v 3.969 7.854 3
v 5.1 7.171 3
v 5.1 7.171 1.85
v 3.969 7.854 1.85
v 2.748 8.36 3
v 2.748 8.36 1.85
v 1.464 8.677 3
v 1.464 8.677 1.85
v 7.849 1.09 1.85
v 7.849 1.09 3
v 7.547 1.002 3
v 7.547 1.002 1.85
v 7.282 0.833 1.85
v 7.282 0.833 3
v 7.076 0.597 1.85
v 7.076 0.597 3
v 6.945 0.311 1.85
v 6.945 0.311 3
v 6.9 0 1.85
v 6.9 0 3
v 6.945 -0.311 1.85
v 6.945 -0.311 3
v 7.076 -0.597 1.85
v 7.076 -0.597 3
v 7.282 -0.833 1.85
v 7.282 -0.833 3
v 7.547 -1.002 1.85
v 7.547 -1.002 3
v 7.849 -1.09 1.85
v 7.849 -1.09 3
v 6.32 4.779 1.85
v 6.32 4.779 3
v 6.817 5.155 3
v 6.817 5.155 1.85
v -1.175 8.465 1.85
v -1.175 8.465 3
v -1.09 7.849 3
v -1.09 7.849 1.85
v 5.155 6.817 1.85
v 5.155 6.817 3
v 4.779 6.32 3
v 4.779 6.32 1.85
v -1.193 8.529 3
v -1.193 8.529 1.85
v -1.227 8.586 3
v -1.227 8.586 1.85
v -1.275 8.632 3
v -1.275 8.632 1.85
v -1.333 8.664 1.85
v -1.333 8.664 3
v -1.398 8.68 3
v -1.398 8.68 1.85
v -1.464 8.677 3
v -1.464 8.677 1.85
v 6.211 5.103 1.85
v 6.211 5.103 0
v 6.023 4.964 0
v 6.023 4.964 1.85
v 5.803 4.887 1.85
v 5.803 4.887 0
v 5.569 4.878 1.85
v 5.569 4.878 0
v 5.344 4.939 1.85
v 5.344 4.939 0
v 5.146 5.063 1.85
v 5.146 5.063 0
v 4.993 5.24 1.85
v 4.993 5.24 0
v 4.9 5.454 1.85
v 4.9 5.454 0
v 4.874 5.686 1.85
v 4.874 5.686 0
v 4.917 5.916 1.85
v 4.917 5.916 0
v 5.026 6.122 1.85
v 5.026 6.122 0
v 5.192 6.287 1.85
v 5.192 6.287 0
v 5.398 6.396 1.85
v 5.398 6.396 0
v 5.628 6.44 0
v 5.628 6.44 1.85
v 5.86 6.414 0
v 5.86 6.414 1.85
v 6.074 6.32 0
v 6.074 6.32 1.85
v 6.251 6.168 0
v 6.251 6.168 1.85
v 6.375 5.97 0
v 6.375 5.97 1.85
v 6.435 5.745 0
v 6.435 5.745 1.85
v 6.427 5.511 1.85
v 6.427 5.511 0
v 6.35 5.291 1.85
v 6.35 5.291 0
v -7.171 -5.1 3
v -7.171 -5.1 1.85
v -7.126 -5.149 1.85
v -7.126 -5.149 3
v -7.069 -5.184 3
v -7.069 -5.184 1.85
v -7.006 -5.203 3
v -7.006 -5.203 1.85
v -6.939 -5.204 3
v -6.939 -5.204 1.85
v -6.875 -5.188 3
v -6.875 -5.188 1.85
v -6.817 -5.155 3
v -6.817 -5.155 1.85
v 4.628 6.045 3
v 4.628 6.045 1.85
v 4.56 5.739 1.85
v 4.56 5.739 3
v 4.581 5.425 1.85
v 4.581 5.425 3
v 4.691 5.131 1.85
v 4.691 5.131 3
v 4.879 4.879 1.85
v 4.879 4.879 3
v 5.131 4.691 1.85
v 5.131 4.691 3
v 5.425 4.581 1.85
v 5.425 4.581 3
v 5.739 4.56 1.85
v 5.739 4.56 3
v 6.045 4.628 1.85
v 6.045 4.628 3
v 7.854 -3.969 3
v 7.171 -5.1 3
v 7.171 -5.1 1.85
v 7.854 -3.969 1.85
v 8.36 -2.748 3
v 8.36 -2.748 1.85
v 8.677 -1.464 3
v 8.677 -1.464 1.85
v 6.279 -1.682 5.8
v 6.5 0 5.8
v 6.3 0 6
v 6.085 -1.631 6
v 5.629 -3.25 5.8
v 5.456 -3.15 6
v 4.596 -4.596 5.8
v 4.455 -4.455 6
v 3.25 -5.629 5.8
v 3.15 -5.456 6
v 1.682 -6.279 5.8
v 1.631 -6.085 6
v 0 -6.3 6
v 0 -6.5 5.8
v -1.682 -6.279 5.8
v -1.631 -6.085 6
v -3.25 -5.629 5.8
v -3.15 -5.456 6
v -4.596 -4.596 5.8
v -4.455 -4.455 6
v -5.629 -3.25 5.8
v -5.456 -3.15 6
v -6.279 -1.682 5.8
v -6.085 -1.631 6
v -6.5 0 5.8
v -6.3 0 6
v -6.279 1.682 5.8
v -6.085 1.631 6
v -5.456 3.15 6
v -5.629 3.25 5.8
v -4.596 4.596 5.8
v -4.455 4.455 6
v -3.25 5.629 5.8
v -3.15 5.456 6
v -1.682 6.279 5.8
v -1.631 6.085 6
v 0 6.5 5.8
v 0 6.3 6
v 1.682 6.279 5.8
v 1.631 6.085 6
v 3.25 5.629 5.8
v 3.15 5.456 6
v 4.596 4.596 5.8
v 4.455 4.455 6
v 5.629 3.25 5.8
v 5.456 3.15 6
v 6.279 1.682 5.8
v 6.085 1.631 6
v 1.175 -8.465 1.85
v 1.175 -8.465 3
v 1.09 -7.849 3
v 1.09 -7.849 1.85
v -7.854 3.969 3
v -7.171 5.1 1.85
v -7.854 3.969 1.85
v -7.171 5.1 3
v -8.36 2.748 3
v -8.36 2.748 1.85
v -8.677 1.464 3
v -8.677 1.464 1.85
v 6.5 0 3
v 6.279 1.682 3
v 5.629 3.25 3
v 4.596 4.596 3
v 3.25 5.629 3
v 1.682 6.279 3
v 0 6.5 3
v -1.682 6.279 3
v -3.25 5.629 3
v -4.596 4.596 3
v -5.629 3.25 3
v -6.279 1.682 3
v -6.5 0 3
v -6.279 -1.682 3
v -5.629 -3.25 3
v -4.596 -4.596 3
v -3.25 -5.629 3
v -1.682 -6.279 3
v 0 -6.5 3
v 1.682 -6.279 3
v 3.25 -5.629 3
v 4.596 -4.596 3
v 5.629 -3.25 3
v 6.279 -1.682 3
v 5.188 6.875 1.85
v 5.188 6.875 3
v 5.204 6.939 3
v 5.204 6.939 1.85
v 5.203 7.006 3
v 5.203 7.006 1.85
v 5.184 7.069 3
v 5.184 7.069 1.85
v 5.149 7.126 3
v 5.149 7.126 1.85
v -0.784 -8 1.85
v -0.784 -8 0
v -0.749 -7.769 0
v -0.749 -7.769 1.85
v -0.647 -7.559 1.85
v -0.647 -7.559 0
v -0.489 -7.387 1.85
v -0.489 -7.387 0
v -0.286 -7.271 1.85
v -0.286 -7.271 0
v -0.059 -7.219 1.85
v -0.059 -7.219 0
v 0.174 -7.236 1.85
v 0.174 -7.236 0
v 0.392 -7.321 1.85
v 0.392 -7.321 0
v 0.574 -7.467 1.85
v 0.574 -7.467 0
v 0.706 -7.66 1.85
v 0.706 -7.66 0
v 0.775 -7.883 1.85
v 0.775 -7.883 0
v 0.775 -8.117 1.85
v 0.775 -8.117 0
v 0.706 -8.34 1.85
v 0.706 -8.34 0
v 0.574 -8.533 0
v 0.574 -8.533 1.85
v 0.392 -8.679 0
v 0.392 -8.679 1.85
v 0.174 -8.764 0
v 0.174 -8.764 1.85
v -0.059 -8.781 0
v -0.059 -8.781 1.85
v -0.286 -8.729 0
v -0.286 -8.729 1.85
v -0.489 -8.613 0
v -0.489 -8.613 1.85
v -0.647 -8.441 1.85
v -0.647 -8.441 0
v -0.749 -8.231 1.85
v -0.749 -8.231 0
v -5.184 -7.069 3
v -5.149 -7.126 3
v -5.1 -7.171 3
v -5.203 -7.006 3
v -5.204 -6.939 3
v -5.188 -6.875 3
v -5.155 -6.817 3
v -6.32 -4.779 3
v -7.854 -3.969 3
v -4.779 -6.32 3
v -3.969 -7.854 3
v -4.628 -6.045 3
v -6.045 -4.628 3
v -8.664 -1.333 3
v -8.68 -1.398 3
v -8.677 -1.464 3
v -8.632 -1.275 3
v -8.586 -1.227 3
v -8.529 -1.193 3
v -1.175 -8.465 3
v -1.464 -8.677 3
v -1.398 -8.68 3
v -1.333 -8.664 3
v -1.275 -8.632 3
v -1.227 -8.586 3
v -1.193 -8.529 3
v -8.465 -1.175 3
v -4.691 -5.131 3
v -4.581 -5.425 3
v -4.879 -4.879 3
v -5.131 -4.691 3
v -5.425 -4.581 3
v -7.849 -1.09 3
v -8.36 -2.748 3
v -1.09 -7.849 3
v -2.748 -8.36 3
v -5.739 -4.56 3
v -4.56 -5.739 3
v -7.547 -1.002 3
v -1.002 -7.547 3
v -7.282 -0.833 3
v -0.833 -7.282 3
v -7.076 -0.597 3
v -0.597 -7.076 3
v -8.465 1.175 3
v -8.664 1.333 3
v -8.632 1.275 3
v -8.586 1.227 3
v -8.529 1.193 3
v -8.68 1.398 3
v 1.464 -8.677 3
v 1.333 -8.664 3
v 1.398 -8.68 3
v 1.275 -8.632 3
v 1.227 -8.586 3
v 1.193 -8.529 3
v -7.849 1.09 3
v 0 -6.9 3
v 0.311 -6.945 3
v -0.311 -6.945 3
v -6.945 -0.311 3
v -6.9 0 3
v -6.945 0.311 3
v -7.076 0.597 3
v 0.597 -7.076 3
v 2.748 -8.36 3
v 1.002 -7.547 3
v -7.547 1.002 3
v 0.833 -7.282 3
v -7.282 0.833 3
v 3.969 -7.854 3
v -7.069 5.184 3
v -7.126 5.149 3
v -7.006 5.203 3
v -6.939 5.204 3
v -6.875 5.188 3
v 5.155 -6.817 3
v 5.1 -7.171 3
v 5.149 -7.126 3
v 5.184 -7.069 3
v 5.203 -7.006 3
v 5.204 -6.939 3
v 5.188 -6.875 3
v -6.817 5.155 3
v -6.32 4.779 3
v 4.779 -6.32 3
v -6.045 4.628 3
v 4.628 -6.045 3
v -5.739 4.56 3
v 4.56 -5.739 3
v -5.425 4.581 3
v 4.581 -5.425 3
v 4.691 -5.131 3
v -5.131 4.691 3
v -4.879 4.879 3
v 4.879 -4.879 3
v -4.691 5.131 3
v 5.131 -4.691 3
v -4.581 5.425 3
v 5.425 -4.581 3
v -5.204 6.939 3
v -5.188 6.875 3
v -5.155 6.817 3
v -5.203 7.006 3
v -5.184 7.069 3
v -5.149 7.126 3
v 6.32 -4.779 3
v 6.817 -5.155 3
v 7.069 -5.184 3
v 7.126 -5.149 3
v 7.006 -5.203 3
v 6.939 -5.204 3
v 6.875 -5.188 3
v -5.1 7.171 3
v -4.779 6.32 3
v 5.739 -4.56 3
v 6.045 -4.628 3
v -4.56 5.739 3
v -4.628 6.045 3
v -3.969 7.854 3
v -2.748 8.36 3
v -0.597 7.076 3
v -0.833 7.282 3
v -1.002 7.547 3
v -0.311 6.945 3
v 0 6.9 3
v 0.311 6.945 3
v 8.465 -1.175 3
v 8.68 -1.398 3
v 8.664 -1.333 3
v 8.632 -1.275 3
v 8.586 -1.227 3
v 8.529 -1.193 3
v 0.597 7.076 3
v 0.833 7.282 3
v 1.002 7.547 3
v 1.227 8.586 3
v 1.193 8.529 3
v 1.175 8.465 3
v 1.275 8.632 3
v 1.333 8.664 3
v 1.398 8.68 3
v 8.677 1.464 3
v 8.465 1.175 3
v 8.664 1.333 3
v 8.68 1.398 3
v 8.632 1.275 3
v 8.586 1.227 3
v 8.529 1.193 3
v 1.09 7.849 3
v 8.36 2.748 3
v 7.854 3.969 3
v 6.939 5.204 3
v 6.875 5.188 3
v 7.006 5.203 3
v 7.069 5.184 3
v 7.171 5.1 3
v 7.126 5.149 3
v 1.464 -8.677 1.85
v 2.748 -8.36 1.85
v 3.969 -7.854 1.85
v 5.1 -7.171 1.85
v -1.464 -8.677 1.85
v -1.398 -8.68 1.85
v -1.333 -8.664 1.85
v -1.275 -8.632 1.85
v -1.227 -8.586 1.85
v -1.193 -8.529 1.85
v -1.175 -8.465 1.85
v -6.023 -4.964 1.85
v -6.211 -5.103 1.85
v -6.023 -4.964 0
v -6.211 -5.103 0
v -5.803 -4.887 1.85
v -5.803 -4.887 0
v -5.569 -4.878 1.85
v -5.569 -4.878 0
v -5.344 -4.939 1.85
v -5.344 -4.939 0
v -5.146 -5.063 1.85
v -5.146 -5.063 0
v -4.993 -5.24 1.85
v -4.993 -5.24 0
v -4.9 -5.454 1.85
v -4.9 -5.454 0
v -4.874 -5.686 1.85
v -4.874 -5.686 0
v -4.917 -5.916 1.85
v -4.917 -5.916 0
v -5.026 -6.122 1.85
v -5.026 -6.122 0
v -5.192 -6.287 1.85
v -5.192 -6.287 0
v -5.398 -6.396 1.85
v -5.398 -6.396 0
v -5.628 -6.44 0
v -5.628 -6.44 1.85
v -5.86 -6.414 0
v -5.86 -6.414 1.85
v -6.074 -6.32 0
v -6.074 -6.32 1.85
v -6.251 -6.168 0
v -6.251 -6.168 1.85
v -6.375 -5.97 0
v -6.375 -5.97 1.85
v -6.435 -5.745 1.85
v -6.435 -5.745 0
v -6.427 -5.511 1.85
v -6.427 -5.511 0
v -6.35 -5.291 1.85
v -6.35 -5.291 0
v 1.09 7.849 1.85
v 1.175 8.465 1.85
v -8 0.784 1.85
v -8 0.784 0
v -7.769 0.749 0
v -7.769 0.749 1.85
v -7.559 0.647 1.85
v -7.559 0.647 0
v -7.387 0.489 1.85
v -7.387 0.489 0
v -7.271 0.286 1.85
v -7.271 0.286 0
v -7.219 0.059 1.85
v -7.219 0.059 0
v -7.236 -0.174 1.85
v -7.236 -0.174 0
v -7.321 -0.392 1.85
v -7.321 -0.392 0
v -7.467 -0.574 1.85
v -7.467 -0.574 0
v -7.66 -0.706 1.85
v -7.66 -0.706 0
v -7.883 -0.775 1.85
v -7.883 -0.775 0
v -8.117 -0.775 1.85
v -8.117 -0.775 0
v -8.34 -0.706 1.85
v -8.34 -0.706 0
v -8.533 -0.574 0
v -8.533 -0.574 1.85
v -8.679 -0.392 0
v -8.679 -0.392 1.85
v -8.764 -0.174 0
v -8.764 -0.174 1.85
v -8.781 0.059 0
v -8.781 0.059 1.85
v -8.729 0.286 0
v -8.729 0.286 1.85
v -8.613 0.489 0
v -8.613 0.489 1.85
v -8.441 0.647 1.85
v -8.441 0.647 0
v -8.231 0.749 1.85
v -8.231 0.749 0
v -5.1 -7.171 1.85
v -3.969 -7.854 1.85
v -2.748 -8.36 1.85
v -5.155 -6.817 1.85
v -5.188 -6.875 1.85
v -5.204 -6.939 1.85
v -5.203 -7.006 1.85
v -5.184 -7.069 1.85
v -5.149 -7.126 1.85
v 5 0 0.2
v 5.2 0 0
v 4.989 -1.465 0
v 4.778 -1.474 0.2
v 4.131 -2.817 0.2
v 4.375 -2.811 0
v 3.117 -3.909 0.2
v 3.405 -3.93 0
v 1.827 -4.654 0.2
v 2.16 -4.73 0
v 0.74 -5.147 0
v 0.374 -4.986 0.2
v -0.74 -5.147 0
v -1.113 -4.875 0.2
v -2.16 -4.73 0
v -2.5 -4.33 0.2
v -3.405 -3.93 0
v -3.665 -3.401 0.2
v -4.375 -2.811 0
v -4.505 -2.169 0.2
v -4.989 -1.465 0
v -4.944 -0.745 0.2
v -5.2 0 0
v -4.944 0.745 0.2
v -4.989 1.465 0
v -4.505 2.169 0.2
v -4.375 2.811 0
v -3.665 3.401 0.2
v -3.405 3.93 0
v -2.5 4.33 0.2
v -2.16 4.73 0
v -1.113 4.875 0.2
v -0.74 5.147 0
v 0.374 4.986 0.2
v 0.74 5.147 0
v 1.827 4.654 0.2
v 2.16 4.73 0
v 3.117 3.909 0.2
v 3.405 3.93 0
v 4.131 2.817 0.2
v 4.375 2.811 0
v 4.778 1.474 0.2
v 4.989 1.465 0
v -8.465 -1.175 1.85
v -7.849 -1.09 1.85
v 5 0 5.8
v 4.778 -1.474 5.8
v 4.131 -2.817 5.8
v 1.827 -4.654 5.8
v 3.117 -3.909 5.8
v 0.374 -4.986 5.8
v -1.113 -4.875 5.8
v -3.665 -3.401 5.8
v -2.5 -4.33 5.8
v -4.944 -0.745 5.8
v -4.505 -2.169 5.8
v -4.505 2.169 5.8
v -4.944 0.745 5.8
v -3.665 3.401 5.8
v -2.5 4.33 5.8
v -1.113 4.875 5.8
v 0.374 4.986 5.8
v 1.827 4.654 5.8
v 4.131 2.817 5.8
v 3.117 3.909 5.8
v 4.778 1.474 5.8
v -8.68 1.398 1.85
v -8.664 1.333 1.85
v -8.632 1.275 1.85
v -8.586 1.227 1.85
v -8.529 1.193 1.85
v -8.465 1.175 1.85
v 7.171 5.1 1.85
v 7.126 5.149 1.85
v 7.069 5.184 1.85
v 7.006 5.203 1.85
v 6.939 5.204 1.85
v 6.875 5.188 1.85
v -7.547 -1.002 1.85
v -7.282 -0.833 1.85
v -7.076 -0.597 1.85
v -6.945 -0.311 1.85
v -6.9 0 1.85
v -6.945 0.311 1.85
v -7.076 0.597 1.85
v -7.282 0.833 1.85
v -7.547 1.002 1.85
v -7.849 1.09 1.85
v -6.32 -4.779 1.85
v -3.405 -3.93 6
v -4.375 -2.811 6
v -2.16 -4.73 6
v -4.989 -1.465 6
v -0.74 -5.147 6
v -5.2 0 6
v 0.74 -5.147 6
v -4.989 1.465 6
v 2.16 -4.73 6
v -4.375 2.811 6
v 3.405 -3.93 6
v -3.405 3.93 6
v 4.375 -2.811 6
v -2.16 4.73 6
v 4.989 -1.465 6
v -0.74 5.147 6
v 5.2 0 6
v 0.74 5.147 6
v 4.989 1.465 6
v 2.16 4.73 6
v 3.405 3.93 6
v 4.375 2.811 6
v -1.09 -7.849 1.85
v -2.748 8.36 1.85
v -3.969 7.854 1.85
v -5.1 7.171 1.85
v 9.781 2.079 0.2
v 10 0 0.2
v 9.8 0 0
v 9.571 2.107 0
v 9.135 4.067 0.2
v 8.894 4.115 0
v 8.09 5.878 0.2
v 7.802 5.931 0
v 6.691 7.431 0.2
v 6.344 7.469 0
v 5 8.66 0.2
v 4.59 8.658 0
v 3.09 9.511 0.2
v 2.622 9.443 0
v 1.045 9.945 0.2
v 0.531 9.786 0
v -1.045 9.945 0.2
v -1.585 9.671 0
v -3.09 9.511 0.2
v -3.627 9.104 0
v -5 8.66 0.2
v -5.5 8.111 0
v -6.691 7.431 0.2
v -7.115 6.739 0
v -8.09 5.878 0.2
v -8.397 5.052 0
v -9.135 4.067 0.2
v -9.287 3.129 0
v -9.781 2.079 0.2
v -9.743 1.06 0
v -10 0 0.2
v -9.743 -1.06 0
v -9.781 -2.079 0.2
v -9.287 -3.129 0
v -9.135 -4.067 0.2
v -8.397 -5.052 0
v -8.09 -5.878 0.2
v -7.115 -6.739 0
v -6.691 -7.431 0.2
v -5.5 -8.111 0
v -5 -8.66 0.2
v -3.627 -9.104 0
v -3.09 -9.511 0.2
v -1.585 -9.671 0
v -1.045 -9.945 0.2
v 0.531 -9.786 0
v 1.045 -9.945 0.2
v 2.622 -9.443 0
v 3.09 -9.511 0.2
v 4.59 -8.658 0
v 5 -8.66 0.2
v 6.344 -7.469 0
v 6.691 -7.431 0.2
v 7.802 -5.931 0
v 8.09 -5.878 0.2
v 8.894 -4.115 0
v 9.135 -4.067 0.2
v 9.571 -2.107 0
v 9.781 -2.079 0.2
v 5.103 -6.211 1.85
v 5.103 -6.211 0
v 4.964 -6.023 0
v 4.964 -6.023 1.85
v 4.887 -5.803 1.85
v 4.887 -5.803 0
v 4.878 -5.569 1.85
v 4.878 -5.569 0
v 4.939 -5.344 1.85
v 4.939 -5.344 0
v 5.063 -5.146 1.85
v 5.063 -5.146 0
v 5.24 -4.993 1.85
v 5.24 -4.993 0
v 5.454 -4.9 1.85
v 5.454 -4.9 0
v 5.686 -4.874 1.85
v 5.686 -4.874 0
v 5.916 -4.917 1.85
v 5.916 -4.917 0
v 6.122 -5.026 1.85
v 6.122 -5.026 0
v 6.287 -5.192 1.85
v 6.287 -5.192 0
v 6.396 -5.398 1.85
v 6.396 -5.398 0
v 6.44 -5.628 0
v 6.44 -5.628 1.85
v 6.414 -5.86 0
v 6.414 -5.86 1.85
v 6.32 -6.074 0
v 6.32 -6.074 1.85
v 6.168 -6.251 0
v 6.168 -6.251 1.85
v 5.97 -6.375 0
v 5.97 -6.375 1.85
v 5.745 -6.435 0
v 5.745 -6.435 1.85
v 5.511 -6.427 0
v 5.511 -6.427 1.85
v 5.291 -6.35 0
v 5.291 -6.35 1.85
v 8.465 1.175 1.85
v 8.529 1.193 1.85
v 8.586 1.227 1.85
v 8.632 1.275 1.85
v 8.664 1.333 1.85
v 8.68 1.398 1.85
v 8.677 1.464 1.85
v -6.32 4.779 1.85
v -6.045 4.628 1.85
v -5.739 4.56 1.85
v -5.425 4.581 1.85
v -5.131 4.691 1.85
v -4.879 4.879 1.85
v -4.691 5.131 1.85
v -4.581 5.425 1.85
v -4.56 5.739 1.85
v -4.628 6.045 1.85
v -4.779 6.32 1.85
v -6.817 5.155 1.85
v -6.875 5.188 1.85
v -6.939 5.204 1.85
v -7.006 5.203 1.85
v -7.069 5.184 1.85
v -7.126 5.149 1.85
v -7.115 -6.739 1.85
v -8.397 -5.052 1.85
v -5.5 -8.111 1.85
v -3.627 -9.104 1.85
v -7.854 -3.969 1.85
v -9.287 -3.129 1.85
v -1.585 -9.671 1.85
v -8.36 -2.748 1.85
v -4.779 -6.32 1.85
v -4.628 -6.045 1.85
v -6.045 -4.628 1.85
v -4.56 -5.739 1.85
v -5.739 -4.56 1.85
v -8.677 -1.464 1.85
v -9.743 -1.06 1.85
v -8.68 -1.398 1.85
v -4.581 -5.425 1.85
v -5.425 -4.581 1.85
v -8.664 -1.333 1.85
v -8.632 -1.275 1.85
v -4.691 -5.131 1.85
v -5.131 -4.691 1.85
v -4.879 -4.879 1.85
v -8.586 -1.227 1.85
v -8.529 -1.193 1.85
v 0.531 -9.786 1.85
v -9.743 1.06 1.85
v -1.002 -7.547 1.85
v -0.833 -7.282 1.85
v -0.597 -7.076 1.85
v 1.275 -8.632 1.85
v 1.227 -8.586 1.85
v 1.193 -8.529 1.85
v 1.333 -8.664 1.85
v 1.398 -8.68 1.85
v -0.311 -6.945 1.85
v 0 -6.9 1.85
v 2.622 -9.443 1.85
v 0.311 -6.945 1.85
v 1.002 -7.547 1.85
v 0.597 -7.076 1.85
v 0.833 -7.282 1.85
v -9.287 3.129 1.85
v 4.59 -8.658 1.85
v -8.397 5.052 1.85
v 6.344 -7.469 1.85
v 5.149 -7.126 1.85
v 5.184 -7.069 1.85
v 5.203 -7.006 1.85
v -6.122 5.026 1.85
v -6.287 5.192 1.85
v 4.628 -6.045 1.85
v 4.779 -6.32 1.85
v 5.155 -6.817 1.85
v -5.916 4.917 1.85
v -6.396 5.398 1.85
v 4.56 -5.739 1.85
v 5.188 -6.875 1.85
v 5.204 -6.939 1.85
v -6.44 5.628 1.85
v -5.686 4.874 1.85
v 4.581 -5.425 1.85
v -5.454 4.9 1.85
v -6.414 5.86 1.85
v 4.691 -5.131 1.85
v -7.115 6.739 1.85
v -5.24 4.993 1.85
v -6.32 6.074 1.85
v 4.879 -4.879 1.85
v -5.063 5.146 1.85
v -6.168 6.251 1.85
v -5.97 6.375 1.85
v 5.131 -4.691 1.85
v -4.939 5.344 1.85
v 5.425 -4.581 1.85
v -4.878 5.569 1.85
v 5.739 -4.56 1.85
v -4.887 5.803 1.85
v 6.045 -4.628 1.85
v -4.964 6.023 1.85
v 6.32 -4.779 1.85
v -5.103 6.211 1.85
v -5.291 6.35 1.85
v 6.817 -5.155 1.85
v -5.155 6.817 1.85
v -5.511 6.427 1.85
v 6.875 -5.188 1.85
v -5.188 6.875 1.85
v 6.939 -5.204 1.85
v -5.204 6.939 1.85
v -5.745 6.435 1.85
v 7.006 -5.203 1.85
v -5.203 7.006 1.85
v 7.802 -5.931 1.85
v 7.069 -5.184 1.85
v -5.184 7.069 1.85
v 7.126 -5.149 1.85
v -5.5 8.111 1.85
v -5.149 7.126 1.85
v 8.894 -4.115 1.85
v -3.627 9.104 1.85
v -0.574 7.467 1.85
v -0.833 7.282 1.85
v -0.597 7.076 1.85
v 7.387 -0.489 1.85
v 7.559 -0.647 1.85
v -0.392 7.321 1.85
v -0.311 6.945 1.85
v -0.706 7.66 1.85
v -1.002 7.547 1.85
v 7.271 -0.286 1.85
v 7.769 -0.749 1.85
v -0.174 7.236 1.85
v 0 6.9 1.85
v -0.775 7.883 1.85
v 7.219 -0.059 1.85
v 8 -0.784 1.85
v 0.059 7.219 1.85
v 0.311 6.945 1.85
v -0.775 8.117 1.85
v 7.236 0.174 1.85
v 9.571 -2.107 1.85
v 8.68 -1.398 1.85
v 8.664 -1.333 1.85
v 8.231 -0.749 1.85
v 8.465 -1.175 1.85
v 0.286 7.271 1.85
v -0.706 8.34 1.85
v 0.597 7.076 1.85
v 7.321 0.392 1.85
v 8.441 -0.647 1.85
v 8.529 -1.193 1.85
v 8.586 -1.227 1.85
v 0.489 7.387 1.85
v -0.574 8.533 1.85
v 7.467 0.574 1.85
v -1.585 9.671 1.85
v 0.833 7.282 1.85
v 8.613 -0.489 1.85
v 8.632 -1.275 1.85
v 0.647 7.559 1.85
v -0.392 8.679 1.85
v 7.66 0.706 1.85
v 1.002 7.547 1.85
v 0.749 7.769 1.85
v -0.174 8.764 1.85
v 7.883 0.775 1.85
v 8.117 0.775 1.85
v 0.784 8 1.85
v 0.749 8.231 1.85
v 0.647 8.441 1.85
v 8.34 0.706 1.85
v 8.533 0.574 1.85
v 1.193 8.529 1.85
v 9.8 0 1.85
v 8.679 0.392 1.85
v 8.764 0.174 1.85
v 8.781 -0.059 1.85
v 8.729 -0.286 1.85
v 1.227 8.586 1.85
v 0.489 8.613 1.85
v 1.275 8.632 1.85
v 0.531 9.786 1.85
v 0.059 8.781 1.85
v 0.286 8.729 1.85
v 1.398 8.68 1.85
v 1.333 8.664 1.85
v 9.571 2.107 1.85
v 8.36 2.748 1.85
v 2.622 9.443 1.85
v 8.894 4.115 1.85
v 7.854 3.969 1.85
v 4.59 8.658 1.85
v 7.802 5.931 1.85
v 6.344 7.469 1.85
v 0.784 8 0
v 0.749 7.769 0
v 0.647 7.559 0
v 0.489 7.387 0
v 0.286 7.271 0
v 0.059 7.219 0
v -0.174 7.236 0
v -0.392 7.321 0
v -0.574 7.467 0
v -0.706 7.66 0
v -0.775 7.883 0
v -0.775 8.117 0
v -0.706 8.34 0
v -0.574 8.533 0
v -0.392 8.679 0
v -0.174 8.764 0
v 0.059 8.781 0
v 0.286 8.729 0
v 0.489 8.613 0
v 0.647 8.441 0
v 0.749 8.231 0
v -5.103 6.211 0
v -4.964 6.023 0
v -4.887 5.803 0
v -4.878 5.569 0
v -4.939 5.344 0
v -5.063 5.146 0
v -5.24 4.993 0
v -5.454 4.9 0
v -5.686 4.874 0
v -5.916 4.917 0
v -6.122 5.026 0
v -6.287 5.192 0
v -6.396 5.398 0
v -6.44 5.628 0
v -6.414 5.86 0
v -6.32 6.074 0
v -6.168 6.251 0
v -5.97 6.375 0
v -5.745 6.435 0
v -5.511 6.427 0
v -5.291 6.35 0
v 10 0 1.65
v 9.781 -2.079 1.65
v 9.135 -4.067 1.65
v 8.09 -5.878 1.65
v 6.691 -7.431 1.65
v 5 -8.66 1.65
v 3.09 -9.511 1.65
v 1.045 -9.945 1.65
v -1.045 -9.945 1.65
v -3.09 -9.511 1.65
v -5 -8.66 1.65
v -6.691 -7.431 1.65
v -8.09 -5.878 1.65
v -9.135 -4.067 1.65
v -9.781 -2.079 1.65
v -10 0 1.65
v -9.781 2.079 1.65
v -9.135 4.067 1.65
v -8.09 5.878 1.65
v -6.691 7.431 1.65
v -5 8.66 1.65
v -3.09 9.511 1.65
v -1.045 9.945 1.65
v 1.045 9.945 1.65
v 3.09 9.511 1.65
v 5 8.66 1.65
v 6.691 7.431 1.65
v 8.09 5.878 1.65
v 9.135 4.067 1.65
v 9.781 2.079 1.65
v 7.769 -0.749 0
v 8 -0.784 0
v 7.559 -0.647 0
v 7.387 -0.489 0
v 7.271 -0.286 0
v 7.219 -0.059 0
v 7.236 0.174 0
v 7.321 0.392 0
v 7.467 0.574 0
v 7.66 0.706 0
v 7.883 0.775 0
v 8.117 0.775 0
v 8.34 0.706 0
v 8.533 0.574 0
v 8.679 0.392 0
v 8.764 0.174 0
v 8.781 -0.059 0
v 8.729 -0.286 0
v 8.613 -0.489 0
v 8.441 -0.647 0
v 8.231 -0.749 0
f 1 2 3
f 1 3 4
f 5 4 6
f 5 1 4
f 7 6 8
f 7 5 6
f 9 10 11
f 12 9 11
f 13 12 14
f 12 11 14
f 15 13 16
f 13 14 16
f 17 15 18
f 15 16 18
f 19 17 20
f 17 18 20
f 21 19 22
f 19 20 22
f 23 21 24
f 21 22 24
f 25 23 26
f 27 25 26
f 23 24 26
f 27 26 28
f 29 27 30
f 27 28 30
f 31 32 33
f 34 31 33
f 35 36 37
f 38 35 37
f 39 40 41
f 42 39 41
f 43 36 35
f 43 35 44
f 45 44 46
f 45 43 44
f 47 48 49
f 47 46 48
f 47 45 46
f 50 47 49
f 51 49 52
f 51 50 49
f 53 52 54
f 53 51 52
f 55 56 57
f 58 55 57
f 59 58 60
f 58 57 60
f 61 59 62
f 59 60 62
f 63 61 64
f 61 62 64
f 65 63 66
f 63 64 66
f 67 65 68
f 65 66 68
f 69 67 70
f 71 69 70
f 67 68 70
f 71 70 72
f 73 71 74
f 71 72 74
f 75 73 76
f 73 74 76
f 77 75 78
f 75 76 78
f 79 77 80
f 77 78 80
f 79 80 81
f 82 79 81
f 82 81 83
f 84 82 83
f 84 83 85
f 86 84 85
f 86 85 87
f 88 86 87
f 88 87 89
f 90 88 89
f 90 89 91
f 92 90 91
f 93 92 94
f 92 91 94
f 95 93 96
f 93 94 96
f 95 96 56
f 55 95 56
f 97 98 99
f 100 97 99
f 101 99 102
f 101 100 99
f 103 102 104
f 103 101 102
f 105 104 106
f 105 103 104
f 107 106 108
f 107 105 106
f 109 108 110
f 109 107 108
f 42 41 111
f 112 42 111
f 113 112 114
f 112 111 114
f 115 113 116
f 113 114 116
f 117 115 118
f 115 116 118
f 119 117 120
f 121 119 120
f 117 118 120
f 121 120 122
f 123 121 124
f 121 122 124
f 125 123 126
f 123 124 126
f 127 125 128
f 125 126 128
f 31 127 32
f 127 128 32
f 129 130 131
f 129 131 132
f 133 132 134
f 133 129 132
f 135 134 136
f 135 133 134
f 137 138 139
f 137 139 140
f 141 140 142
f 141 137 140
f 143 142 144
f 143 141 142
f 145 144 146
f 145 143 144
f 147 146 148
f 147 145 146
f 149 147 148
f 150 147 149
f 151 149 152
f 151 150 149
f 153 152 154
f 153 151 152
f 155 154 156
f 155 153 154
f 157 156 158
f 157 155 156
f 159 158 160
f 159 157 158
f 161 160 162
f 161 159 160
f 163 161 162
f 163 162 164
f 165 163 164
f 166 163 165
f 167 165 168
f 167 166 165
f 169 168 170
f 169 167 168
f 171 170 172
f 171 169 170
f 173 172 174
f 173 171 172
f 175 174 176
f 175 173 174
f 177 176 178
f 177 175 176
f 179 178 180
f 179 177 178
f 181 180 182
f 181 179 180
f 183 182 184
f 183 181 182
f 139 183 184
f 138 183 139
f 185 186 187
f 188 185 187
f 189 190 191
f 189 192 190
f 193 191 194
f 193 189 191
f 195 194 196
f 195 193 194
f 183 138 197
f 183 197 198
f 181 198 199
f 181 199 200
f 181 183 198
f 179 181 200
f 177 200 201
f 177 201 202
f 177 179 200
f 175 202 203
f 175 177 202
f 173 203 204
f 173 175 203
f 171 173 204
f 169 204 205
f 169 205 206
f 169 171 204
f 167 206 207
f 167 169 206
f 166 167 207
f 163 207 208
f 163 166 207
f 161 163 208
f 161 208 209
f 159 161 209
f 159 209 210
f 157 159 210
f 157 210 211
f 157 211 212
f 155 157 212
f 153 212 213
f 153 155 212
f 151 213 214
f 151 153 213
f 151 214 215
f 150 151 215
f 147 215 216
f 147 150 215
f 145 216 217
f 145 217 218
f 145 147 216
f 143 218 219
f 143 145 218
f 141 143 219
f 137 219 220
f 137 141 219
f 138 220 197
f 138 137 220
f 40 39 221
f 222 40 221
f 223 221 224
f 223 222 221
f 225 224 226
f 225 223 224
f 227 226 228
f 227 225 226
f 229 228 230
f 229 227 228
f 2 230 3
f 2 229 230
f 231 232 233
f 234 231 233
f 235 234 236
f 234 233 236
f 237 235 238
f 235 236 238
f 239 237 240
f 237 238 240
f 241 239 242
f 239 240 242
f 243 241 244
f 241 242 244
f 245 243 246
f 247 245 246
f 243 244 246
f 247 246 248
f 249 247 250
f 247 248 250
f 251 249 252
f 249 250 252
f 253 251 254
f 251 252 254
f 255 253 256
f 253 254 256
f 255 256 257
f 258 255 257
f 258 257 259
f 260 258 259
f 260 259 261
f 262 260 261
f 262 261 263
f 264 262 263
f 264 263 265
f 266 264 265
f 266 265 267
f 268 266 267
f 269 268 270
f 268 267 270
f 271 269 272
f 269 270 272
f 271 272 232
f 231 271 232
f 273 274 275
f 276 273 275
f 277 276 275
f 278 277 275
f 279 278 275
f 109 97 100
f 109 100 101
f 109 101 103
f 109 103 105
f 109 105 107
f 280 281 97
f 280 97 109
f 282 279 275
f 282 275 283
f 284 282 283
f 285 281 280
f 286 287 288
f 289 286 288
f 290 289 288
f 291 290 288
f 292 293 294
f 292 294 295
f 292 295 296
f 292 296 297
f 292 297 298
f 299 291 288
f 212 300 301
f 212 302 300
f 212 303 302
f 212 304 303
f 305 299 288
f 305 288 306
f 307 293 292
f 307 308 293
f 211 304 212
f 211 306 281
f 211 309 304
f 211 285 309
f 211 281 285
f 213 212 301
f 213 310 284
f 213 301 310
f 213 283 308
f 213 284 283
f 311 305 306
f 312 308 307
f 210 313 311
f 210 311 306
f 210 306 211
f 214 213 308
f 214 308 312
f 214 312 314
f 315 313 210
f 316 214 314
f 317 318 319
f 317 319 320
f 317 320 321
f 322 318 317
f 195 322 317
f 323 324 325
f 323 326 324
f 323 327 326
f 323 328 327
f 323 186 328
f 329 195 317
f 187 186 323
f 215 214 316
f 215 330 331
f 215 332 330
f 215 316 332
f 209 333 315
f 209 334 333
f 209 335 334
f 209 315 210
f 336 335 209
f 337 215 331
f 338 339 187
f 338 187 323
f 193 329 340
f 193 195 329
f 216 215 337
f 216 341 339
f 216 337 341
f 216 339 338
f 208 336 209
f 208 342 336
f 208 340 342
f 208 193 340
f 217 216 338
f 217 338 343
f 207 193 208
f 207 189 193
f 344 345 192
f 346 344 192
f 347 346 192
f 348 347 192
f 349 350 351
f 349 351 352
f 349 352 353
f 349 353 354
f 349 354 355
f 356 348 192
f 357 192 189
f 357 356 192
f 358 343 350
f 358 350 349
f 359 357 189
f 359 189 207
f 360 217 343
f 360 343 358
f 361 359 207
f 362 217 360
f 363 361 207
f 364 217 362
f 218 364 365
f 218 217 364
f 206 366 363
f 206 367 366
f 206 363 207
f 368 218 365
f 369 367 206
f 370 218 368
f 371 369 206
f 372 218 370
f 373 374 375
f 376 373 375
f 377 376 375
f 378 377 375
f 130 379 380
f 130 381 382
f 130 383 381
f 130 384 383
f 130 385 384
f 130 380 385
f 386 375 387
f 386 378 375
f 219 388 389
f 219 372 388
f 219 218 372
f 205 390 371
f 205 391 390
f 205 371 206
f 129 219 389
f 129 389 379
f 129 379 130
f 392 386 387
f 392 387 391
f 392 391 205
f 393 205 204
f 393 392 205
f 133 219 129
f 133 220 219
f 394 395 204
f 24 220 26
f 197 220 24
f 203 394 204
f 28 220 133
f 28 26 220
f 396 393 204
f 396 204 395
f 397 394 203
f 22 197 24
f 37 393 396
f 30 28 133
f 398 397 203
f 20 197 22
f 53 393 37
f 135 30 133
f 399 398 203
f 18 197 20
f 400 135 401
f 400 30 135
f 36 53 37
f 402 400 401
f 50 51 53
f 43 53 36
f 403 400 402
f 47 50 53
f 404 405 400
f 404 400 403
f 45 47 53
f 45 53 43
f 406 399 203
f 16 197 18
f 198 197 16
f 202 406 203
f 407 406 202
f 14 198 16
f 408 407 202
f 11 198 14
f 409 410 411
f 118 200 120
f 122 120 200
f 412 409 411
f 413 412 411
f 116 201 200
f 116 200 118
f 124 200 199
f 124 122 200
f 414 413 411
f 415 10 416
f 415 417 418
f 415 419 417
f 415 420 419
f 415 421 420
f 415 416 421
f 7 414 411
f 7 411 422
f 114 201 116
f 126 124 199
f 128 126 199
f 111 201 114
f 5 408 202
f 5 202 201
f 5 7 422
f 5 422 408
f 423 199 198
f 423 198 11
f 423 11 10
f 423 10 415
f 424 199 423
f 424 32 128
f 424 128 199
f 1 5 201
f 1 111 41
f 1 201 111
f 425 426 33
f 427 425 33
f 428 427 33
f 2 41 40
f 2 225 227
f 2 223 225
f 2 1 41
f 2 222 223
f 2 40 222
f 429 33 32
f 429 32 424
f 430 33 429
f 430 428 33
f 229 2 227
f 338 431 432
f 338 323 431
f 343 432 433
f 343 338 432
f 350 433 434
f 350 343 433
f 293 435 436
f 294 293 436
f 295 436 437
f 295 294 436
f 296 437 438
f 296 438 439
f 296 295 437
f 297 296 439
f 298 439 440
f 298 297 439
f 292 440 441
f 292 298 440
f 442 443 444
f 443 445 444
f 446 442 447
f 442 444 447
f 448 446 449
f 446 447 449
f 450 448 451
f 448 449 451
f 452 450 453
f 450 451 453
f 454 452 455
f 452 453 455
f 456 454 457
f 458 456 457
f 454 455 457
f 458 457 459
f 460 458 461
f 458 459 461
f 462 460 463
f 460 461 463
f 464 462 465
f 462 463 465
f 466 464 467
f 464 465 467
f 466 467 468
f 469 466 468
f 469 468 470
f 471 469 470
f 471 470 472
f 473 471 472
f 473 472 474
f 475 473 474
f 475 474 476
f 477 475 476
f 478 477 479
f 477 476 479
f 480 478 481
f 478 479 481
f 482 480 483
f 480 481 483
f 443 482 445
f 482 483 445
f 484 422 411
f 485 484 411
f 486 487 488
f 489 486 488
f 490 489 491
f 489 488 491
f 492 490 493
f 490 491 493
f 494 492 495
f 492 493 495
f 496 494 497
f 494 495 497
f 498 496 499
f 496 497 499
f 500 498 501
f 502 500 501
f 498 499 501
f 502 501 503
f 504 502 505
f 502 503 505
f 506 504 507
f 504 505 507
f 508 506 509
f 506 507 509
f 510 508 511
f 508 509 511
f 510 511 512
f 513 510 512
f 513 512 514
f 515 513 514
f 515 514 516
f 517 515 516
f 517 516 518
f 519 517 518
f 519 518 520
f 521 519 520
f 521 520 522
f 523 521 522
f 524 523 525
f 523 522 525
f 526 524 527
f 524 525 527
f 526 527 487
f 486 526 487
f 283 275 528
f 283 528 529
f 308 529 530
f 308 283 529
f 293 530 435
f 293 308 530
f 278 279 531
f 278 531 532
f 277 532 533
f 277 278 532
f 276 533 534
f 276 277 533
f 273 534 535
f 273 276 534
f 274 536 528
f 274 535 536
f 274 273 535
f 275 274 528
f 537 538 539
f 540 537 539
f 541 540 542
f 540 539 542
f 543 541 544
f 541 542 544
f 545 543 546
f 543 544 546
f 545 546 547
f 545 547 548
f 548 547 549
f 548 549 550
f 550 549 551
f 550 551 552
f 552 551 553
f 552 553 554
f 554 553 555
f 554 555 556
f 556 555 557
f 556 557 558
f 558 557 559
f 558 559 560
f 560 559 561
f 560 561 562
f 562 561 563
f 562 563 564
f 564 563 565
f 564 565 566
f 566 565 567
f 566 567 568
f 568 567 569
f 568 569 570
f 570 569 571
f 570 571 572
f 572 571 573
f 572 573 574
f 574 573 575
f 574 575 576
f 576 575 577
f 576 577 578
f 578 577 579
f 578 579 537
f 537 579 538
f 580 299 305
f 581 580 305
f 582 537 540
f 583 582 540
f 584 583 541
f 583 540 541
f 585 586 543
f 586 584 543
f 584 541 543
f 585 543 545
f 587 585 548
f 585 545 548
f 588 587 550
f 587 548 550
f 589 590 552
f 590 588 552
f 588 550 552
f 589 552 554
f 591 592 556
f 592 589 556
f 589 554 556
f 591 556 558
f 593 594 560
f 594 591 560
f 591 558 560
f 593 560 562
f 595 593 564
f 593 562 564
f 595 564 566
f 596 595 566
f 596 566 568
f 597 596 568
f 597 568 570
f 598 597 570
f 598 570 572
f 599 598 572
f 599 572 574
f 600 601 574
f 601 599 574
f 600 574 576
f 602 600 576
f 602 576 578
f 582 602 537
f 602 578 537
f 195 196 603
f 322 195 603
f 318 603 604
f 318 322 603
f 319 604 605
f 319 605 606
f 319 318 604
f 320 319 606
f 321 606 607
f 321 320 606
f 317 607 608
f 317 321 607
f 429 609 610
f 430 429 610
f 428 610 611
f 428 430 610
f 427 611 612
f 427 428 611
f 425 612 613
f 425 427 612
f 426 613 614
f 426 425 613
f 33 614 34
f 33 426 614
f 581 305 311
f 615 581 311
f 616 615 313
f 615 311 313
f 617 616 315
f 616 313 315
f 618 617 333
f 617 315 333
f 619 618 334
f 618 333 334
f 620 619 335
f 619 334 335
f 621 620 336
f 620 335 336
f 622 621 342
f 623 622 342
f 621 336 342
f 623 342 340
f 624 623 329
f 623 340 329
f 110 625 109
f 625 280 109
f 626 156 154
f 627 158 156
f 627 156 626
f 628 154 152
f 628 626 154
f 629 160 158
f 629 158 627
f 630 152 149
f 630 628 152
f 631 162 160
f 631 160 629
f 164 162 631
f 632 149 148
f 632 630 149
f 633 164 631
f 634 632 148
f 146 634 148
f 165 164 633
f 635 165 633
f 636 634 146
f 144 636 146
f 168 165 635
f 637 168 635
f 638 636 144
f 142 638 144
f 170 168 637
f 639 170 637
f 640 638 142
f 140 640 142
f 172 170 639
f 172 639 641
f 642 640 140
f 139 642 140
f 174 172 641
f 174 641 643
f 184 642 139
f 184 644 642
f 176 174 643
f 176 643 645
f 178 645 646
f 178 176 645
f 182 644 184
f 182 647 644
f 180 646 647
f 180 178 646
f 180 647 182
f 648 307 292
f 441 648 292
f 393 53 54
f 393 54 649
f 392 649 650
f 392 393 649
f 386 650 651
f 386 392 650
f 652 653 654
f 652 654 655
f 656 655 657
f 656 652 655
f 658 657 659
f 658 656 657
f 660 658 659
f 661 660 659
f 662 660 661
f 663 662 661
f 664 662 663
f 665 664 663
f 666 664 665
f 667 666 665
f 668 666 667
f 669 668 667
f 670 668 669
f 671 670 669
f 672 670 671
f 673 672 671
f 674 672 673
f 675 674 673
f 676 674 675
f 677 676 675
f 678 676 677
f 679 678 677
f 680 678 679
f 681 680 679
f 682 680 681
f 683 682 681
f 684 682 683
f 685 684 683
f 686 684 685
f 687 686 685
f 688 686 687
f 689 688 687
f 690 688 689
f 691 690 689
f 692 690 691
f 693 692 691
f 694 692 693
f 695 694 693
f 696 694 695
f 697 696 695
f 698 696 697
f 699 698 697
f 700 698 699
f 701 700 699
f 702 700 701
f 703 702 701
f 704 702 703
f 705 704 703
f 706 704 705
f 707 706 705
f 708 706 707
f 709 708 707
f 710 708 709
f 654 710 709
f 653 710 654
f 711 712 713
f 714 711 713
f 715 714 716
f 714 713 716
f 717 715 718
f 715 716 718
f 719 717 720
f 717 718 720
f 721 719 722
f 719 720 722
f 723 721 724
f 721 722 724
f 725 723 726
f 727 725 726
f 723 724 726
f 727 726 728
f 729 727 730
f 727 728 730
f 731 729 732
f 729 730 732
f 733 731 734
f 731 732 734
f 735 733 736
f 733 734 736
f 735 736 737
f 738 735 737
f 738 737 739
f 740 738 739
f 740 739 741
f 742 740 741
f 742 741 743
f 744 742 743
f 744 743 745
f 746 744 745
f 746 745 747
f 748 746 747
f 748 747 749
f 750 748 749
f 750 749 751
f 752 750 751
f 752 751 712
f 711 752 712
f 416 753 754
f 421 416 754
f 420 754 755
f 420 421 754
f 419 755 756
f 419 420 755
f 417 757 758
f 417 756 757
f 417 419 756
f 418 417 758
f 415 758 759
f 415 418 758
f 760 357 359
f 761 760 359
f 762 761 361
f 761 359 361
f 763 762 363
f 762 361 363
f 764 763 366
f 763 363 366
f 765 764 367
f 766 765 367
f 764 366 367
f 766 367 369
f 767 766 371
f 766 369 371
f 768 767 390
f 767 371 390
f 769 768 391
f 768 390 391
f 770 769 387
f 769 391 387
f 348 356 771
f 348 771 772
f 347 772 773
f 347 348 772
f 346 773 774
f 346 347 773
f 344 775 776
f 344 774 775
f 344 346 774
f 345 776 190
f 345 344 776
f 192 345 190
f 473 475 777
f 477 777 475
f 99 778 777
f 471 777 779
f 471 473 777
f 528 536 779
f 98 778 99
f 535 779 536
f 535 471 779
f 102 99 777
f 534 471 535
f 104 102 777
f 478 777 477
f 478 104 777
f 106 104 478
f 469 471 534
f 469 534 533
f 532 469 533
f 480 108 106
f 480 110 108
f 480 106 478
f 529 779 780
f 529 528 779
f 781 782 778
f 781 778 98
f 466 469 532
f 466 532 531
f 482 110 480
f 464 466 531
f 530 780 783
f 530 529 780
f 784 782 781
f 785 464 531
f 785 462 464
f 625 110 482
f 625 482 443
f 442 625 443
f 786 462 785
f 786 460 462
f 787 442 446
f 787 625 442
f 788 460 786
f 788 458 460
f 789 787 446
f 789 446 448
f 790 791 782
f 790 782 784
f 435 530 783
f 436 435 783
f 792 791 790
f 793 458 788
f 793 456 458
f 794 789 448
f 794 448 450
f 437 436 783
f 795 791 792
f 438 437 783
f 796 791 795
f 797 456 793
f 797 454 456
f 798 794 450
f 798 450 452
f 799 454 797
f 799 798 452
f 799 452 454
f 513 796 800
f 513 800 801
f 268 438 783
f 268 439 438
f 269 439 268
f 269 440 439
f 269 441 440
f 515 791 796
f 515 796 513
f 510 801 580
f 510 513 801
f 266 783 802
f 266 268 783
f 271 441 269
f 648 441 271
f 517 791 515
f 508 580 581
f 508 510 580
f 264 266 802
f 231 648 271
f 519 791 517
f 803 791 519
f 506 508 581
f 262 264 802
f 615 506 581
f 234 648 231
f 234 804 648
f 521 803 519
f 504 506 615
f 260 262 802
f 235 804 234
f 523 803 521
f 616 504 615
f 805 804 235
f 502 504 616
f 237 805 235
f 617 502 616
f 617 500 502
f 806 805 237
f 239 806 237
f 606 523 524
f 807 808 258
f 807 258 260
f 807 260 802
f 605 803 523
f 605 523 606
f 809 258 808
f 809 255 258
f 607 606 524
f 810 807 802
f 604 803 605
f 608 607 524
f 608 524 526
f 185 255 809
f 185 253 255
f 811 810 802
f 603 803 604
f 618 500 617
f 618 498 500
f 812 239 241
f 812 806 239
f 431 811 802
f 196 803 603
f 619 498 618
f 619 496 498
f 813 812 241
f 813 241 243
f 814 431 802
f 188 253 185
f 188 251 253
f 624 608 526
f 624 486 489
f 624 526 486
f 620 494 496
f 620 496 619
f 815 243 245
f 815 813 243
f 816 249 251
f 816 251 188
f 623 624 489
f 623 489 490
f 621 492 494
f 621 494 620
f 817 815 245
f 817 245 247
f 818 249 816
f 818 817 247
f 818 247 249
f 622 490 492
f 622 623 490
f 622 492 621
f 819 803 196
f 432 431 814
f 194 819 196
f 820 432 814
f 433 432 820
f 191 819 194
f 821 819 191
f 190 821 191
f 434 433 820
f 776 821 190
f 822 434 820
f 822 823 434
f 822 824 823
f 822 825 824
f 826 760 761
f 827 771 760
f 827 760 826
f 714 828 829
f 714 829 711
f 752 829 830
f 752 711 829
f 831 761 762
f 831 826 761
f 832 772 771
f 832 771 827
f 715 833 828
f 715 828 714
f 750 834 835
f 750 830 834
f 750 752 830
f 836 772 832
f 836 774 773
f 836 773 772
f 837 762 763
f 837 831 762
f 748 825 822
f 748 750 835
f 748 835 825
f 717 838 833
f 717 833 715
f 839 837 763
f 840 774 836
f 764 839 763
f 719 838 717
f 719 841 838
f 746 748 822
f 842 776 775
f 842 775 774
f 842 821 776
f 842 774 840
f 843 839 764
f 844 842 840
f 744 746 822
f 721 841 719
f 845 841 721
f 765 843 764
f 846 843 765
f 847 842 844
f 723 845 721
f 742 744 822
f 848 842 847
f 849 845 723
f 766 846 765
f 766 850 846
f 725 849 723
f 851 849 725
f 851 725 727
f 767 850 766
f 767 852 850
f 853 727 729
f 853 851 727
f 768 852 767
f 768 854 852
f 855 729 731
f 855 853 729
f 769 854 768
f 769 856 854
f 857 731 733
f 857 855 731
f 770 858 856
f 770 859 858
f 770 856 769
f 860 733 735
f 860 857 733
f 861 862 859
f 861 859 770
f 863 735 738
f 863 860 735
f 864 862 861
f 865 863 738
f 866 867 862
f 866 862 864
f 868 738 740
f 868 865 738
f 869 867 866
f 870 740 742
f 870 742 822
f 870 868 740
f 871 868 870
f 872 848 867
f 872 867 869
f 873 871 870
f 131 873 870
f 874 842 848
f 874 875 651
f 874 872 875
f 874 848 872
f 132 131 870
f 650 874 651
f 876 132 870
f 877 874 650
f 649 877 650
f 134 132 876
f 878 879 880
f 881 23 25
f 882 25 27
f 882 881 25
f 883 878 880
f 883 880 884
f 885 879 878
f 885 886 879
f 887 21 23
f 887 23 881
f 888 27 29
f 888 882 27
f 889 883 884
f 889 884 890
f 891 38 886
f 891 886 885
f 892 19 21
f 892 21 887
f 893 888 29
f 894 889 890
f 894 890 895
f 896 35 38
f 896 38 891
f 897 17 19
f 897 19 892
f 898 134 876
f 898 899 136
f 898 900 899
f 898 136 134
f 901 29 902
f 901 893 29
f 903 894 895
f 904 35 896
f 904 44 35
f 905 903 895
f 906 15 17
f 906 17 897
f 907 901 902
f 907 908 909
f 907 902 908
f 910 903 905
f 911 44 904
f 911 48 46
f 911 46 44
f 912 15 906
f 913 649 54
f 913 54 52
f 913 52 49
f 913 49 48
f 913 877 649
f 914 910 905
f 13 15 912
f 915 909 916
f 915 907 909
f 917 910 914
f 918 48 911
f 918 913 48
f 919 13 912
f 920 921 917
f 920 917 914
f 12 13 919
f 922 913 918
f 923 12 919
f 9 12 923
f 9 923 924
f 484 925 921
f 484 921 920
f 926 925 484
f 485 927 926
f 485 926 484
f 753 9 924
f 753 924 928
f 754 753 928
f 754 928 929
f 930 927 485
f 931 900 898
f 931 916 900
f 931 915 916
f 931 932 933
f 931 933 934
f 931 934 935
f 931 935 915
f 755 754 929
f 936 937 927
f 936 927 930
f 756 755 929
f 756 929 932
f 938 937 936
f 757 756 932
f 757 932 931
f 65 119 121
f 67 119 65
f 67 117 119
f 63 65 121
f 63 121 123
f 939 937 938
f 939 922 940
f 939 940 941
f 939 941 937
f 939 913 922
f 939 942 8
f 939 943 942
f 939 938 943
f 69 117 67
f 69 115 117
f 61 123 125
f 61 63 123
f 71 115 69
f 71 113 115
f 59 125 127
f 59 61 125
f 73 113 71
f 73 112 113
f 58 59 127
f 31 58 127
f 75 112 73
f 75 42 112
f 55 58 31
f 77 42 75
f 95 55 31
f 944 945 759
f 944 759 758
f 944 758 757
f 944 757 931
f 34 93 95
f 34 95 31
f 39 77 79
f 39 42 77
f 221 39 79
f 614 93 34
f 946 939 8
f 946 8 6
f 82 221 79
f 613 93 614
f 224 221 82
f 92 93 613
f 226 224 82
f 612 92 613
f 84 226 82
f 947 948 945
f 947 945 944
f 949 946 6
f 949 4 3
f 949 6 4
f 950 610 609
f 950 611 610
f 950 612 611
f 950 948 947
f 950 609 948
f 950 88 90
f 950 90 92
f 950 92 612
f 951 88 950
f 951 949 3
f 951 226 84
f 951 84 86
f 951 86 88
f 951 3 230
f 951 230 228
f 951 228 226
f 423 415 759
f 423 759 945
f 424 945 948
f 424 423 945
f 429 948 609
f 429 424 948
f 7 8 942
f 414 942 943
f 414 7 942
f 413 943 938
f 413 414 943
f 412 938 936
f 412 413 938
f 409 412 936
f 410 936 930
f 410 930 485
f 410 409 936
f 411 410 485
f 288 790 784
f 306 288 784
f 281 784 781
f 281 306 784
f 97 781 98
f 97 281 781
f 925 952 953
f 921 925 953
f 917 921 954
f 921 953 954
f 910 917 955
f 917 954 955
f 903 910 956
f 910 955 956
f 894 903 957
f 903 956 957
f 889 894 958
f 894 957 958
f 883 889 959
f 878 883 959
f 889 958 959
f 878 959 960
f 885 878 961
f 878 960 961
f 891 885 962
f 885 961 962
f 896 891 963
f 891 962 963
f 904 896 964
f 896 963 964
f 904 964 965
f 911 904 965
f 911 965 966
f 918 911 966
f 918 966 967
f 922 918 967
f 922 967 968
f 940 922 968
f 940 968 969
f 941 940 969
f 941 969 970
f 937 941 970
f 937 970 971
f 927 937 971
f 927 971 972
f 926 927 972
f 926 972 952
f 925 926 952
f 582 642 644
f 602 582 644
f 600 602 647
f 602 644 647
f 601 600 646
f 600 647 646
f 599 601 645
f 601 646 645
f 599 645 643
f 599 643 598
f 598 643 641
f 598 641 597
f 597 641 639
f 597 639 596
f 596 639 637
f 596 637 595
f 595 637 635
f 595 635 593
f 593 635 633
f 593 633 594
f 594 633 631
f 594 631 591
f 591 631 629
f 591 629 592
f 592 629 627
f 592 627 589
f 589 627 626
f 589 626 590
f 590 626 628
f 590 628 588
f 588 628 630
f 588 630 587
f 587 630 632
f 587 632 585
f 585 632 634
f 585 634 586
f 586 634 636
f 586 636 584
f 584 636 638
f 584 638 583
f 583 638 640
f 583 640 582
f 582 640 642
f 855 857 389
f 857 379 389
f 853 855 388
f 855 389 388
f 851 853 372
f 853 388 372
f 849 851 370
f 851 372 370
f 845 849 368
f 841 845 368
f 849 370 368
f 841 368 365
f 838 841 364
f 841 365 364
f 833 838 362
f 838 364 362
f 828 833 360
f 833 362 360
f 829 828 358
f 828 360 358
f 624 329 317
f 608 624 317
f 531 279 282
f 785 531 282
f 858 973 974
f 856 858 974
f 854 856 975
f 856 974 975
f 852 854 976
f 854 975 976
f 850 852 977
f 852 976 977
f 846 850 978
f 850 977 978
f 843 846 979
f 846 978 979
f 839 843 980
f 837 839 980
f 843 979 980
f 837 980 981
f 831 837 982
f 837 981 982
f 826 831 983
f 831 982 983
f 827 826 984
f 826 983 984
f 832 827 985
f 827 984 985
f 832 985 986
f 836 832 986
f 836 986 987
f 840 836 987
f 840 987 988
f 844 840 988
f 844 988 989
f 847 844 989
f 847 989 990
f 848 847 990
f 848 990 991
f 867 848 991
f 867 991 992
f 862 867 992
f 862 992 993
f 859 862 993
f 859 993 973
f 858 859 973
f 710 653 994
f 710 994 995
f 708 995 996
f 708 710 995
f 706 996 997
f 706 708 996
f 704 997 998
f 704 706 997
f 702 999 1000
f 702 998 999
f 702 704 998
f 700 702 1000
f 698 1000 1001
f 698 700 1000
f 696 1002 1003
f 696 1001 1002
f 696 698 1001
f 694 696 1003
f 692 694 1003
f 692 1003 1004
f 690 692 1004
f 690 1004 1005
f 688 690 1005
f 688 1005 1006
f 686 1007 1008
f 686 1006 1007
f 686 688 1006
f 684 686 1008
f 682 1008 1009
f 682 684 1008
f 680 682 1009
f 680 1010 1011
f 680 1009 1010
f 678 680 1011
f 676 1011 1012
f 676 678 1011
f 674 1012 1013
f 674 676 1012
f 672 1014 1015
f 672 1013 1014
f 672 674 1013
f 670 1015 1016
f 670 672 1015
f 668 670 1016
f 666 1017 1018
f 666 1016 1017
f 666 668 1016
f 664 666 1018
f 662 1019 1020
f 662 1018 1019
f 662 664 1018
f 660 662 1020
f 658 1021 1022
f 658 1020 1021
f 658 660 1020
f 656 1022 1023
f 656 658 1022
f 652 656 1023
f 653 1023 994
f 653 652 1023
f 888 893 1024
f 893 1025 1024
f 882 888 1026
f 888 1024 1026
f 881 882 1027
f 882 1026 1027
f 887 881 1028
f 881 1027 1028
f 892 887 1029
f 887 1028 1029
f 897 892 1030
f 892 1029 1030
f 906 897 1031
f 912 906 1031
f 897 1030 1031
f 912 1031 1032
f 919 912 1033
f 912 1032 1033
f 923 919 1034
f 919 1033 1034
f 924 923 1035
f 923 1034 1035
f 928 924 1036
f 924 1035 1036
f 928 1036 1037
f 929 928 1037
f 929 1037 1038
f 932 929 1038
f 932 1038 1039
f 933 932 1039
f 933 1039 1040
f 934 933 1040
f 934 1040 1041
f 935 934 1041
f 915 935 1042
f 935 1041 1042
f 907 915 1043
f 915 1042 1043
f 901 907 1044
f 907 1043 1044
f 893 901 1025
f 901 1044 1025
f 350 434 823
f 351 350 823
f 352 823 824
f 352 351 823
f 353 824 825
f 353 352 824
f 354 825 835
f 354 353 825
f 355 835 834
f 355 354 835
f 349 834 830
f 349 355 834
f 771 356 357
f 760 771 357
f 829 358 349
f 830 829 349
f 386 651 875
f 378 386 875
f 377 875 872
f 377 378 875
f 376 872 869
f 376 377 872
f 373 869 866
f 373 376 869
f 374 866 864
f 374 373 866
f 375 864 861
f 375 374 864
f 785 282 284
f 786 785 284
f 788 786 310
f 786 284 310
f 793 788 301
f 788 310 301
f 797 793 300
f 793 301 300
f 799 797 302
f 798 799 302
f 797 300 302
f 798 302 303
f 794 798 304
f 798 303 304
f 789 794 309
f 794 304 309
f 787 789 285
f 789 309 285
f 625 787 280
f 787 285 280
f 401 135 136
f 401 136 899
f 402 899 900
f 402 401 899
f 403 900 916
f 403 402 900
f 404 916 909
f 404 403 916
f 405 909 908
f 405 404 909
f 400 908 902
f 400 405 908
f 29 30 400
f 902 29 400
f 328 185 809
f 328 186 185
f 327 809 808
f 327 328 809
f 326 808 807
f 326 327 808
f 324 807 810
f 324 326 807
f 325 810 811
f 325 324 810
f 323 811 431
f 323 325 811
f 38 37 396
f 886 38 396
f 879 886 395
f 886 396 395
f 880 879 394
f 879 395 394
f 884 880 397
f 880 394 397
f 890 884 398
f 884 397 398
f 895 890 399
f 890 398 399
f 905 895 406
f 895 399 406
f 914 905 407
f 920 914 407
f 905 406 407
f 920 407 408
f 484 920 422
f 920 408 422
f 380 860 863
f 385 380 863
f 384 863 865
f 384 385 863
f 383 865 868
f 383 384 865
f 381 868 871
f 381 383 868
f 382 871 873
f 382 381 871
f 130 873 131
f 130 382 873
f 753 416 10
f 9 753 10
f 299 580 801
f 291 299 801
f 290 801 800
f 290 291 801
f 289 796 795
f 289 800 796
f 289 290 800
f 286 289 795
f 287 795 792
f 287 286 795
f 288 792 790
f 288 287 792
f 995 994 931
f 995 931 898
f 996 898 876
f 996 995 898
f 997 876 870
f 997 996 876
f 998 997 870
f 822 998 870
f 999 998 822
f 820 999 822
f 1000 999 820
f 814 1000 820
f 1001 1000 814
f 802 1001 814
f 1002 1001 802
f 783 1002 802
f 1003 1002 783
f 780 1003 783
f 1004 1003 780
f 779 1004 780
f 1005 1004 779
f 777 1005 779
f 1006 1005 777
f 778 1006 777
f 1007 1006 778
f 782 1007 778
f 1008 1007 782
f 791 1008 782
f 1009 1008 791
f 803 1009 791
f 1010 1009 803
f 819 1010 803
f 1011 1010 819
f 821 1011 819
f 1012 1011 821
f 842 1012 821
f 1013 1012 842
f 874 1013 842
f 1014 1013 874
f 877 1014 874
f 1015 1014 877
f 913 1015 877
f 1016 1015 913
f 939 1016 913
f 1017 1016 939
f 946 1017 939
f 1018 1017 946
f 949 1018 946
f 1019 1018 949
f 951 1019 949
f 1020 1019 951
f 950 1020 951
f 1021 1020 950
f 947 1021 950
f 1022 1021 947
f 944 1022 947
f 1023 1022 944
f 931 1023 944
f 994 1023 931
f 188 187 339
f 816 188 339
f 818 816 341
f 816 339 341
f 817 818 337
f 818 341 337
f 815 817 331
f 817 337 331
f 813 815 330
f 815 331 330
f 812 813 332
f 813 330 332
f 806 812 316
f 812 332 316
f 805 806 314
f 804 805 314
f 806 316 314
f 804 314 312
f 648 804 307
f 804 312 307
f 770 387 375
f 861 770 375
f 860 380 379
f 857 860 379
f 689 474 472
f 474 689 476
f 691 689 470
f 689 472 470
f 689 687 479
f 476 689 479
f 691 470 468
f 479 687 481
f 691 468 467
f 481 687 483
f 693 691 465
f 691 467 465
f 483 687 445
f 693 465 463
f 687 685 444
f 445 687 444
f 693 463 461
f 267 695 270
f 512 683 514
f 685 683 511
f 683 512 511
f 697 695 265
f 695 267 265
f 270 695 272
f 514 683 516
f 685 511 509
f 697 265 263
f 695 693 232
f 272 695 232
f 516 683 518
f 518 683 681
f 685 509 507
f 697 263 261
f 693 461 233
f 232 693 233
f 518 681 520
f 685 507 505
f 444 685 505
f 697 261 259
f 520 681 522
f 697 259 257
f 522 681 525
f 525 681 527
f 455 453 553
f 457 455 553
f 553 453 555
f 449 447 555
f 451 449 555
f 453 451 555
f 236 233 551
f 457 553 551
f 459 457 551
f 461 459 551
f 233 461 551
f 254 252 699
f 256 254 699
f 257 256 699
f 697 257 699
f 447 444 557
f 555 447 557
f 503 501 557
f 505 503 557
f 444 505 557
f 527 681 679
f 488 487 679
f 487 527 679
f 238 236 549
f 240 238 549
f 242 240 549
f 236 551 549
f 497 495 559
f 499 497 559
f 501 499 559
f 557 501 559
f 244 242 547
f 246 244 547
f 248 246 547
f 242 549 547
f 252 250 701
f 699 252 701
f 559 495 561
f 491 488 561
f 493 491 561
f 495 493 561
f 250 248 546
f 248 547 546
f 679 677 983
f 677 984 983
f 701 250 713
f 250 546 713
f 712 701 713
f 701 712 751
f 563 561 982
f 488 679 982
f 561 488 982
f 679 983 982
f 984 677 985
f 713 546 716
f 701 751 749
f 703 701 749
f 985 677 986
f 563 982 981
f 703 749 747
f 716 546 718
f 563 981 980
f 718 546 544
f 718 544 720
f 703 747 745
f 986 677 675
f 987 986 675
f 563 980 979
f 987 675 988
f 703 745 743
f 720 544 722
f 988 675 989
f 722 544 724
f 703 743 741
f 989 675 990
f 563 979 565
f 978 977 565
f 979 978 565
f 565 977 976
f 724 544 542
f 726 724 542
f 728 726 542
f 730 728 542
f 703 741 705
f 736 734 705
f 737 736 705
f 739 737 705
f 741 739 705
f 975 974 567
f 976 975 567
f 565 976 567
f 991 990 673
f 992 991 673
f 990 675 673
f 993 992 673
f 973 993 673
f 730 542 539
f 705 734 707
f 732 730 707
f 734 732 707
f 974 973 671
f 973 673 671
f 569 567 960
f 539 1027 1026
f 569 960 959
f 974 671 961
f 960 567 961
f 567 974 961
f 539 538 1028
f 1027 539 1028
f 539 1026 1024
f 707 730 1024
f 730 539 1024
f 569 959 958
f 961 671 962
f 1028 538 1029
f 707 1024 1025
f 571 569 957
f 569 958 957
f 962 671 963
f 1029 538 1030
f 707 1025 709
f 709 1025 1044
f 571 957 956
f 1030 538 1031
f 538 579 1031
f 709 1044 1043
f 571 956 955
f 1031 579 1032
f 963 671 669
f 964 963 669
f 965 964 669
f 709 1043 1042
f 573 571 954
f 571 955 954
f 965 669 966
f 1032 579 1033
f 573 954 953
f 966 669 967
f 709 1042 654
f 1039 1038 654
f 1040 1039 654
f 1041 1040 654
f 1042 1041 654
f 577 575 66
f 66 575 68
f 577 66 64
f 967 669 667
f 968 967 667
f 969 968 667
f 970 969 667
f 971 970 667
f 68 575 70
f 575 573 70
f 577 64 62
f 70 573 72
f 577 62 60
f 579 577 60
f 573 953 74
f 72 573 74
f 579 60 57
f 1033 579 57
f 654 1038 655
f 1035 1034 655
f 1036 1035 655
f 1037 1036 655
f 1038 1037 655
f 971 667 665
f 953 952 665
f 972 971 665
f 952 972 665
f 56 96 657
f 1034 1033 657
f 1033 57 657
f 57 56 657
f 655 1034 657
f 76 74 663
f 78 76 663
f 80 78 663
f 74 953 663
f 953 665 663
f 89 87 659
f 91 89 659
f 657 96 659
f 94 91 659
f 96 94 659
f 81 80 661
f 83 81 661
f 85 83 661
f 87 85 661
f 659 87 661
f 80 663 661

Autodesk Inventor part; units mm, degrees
ref_plane "YZ Plane" through (0, 0, 0) normal (1, 0, 0) x (0, 1, 0)
ref_plane "XZ Plane" through (0, 0, 0) normal (0, 1, 0) x (-1, 0, 0)
ref_plane "XY Plane" through (0, 0, 0) normal (0, 0, 1) x (1, 0, 0)
sketch "Sketch1" plane through (0, 0, 0) normal (0, 0, 1) x (1, 0, 0)
  point P0 (0, 0)
sketch "Sketch2" plane through (0, 0, 0) normal (0, 0, 1) x (1, 0, 0)
  circle A0 centre (0, 0) radius 5
  circle A1 centre (0, 0) radius 10
  circle A2 centre (0, 0) radius 8 construction
  line L0 (0, 0) -> (8, 0) construction
  dimension "d2" = 16
  dimension "d0" = 10
  dimension "d1" = 20
extrude "Extrusion1" add sketch "Sketch2" along normal blind 6
sketch "Sketch3" plane through (0, 0, 6) normal (0, 0, 1) x (1, 0, 0)
  circle A0 centre (0, 0) radius 6.5
  circle A1 centre (0, 0) radius 10 projected
  dimension "d5" = 13
extrude "Extrusion2" cut sketch "Sketch3" against normal blind 3
sketch "Sketch4" plane through (0, 0, 3) normal (0, 0, 1) x (1, 0, 0)
  circle A0 centre (0, 0) radius 8.8
  circle A1 centre (0, 0) radius 10 projected
  dimension "d8" = 17.6
extrude "Extrusion3" cut sketch "Sketch4" against normal blind 1.15
sketch "Sketch5" plane through (0, 0, 3) normal (0, 0, 1) x (1, 0, 0)
  line L0 (0, 0) -> (8, 0) construction
  circle A0 centre (0, 0) radius 8 construction
  line L1 (8, 0) -> (10, 0) construction
  line L2 (7.8487, -1.0896) -> (9.8109, -1.3619)
  line L3 (9.8109, 1.3619) -> (7.8487, 1.0896)
  arc A1 (7.8487, 1.0896) -> (7.8487, -1.0896) centre (8, 0) ccw
  arc A2 (9.8109, -1.3619) -> (9.8109, 1.3619) centre (10, 0) ccw
  line L4 (7.8487, 1.0896) -> (0, 0) construction
  circle A3 centre (0, 0) radius 10 construction
  point P0 (9, 0)
  dimension "d11" = 16
  dimension "d12" = 1.1
extrude "Extrusion4" cut sketch "Sketch5" against normal up to surface (1.15 mm away)
fillet "Fillet1" radius 0.25 2 edges at (8.7164, -1.21, 2.425) (8.7164, 1.21, 2.425)
hole "Hole1" at (8, 0, 3) direction (0, 0, -1) diameter 1.567 end through all thread size "M2x0.4" class "6H" standard "ANSI Metric M Profile"
pattern_circular "Circular Pattern1" count 8 over 360 about axis through (0, 0, -10) along (0, 0, 1) of "Extrusion4", "Fillet1", "Hole1"
chamfer "Chamfer1" distance 0.2 angle 45 5 edges at (-5, 0, 6) (-5, 0, 0) (-6.5, 0, 6) (-10, 0, 0) (-10, 0, 1.85)
properties part number "16_029_X430_FREE_HORN_R1" material "Aluminum 6061"
